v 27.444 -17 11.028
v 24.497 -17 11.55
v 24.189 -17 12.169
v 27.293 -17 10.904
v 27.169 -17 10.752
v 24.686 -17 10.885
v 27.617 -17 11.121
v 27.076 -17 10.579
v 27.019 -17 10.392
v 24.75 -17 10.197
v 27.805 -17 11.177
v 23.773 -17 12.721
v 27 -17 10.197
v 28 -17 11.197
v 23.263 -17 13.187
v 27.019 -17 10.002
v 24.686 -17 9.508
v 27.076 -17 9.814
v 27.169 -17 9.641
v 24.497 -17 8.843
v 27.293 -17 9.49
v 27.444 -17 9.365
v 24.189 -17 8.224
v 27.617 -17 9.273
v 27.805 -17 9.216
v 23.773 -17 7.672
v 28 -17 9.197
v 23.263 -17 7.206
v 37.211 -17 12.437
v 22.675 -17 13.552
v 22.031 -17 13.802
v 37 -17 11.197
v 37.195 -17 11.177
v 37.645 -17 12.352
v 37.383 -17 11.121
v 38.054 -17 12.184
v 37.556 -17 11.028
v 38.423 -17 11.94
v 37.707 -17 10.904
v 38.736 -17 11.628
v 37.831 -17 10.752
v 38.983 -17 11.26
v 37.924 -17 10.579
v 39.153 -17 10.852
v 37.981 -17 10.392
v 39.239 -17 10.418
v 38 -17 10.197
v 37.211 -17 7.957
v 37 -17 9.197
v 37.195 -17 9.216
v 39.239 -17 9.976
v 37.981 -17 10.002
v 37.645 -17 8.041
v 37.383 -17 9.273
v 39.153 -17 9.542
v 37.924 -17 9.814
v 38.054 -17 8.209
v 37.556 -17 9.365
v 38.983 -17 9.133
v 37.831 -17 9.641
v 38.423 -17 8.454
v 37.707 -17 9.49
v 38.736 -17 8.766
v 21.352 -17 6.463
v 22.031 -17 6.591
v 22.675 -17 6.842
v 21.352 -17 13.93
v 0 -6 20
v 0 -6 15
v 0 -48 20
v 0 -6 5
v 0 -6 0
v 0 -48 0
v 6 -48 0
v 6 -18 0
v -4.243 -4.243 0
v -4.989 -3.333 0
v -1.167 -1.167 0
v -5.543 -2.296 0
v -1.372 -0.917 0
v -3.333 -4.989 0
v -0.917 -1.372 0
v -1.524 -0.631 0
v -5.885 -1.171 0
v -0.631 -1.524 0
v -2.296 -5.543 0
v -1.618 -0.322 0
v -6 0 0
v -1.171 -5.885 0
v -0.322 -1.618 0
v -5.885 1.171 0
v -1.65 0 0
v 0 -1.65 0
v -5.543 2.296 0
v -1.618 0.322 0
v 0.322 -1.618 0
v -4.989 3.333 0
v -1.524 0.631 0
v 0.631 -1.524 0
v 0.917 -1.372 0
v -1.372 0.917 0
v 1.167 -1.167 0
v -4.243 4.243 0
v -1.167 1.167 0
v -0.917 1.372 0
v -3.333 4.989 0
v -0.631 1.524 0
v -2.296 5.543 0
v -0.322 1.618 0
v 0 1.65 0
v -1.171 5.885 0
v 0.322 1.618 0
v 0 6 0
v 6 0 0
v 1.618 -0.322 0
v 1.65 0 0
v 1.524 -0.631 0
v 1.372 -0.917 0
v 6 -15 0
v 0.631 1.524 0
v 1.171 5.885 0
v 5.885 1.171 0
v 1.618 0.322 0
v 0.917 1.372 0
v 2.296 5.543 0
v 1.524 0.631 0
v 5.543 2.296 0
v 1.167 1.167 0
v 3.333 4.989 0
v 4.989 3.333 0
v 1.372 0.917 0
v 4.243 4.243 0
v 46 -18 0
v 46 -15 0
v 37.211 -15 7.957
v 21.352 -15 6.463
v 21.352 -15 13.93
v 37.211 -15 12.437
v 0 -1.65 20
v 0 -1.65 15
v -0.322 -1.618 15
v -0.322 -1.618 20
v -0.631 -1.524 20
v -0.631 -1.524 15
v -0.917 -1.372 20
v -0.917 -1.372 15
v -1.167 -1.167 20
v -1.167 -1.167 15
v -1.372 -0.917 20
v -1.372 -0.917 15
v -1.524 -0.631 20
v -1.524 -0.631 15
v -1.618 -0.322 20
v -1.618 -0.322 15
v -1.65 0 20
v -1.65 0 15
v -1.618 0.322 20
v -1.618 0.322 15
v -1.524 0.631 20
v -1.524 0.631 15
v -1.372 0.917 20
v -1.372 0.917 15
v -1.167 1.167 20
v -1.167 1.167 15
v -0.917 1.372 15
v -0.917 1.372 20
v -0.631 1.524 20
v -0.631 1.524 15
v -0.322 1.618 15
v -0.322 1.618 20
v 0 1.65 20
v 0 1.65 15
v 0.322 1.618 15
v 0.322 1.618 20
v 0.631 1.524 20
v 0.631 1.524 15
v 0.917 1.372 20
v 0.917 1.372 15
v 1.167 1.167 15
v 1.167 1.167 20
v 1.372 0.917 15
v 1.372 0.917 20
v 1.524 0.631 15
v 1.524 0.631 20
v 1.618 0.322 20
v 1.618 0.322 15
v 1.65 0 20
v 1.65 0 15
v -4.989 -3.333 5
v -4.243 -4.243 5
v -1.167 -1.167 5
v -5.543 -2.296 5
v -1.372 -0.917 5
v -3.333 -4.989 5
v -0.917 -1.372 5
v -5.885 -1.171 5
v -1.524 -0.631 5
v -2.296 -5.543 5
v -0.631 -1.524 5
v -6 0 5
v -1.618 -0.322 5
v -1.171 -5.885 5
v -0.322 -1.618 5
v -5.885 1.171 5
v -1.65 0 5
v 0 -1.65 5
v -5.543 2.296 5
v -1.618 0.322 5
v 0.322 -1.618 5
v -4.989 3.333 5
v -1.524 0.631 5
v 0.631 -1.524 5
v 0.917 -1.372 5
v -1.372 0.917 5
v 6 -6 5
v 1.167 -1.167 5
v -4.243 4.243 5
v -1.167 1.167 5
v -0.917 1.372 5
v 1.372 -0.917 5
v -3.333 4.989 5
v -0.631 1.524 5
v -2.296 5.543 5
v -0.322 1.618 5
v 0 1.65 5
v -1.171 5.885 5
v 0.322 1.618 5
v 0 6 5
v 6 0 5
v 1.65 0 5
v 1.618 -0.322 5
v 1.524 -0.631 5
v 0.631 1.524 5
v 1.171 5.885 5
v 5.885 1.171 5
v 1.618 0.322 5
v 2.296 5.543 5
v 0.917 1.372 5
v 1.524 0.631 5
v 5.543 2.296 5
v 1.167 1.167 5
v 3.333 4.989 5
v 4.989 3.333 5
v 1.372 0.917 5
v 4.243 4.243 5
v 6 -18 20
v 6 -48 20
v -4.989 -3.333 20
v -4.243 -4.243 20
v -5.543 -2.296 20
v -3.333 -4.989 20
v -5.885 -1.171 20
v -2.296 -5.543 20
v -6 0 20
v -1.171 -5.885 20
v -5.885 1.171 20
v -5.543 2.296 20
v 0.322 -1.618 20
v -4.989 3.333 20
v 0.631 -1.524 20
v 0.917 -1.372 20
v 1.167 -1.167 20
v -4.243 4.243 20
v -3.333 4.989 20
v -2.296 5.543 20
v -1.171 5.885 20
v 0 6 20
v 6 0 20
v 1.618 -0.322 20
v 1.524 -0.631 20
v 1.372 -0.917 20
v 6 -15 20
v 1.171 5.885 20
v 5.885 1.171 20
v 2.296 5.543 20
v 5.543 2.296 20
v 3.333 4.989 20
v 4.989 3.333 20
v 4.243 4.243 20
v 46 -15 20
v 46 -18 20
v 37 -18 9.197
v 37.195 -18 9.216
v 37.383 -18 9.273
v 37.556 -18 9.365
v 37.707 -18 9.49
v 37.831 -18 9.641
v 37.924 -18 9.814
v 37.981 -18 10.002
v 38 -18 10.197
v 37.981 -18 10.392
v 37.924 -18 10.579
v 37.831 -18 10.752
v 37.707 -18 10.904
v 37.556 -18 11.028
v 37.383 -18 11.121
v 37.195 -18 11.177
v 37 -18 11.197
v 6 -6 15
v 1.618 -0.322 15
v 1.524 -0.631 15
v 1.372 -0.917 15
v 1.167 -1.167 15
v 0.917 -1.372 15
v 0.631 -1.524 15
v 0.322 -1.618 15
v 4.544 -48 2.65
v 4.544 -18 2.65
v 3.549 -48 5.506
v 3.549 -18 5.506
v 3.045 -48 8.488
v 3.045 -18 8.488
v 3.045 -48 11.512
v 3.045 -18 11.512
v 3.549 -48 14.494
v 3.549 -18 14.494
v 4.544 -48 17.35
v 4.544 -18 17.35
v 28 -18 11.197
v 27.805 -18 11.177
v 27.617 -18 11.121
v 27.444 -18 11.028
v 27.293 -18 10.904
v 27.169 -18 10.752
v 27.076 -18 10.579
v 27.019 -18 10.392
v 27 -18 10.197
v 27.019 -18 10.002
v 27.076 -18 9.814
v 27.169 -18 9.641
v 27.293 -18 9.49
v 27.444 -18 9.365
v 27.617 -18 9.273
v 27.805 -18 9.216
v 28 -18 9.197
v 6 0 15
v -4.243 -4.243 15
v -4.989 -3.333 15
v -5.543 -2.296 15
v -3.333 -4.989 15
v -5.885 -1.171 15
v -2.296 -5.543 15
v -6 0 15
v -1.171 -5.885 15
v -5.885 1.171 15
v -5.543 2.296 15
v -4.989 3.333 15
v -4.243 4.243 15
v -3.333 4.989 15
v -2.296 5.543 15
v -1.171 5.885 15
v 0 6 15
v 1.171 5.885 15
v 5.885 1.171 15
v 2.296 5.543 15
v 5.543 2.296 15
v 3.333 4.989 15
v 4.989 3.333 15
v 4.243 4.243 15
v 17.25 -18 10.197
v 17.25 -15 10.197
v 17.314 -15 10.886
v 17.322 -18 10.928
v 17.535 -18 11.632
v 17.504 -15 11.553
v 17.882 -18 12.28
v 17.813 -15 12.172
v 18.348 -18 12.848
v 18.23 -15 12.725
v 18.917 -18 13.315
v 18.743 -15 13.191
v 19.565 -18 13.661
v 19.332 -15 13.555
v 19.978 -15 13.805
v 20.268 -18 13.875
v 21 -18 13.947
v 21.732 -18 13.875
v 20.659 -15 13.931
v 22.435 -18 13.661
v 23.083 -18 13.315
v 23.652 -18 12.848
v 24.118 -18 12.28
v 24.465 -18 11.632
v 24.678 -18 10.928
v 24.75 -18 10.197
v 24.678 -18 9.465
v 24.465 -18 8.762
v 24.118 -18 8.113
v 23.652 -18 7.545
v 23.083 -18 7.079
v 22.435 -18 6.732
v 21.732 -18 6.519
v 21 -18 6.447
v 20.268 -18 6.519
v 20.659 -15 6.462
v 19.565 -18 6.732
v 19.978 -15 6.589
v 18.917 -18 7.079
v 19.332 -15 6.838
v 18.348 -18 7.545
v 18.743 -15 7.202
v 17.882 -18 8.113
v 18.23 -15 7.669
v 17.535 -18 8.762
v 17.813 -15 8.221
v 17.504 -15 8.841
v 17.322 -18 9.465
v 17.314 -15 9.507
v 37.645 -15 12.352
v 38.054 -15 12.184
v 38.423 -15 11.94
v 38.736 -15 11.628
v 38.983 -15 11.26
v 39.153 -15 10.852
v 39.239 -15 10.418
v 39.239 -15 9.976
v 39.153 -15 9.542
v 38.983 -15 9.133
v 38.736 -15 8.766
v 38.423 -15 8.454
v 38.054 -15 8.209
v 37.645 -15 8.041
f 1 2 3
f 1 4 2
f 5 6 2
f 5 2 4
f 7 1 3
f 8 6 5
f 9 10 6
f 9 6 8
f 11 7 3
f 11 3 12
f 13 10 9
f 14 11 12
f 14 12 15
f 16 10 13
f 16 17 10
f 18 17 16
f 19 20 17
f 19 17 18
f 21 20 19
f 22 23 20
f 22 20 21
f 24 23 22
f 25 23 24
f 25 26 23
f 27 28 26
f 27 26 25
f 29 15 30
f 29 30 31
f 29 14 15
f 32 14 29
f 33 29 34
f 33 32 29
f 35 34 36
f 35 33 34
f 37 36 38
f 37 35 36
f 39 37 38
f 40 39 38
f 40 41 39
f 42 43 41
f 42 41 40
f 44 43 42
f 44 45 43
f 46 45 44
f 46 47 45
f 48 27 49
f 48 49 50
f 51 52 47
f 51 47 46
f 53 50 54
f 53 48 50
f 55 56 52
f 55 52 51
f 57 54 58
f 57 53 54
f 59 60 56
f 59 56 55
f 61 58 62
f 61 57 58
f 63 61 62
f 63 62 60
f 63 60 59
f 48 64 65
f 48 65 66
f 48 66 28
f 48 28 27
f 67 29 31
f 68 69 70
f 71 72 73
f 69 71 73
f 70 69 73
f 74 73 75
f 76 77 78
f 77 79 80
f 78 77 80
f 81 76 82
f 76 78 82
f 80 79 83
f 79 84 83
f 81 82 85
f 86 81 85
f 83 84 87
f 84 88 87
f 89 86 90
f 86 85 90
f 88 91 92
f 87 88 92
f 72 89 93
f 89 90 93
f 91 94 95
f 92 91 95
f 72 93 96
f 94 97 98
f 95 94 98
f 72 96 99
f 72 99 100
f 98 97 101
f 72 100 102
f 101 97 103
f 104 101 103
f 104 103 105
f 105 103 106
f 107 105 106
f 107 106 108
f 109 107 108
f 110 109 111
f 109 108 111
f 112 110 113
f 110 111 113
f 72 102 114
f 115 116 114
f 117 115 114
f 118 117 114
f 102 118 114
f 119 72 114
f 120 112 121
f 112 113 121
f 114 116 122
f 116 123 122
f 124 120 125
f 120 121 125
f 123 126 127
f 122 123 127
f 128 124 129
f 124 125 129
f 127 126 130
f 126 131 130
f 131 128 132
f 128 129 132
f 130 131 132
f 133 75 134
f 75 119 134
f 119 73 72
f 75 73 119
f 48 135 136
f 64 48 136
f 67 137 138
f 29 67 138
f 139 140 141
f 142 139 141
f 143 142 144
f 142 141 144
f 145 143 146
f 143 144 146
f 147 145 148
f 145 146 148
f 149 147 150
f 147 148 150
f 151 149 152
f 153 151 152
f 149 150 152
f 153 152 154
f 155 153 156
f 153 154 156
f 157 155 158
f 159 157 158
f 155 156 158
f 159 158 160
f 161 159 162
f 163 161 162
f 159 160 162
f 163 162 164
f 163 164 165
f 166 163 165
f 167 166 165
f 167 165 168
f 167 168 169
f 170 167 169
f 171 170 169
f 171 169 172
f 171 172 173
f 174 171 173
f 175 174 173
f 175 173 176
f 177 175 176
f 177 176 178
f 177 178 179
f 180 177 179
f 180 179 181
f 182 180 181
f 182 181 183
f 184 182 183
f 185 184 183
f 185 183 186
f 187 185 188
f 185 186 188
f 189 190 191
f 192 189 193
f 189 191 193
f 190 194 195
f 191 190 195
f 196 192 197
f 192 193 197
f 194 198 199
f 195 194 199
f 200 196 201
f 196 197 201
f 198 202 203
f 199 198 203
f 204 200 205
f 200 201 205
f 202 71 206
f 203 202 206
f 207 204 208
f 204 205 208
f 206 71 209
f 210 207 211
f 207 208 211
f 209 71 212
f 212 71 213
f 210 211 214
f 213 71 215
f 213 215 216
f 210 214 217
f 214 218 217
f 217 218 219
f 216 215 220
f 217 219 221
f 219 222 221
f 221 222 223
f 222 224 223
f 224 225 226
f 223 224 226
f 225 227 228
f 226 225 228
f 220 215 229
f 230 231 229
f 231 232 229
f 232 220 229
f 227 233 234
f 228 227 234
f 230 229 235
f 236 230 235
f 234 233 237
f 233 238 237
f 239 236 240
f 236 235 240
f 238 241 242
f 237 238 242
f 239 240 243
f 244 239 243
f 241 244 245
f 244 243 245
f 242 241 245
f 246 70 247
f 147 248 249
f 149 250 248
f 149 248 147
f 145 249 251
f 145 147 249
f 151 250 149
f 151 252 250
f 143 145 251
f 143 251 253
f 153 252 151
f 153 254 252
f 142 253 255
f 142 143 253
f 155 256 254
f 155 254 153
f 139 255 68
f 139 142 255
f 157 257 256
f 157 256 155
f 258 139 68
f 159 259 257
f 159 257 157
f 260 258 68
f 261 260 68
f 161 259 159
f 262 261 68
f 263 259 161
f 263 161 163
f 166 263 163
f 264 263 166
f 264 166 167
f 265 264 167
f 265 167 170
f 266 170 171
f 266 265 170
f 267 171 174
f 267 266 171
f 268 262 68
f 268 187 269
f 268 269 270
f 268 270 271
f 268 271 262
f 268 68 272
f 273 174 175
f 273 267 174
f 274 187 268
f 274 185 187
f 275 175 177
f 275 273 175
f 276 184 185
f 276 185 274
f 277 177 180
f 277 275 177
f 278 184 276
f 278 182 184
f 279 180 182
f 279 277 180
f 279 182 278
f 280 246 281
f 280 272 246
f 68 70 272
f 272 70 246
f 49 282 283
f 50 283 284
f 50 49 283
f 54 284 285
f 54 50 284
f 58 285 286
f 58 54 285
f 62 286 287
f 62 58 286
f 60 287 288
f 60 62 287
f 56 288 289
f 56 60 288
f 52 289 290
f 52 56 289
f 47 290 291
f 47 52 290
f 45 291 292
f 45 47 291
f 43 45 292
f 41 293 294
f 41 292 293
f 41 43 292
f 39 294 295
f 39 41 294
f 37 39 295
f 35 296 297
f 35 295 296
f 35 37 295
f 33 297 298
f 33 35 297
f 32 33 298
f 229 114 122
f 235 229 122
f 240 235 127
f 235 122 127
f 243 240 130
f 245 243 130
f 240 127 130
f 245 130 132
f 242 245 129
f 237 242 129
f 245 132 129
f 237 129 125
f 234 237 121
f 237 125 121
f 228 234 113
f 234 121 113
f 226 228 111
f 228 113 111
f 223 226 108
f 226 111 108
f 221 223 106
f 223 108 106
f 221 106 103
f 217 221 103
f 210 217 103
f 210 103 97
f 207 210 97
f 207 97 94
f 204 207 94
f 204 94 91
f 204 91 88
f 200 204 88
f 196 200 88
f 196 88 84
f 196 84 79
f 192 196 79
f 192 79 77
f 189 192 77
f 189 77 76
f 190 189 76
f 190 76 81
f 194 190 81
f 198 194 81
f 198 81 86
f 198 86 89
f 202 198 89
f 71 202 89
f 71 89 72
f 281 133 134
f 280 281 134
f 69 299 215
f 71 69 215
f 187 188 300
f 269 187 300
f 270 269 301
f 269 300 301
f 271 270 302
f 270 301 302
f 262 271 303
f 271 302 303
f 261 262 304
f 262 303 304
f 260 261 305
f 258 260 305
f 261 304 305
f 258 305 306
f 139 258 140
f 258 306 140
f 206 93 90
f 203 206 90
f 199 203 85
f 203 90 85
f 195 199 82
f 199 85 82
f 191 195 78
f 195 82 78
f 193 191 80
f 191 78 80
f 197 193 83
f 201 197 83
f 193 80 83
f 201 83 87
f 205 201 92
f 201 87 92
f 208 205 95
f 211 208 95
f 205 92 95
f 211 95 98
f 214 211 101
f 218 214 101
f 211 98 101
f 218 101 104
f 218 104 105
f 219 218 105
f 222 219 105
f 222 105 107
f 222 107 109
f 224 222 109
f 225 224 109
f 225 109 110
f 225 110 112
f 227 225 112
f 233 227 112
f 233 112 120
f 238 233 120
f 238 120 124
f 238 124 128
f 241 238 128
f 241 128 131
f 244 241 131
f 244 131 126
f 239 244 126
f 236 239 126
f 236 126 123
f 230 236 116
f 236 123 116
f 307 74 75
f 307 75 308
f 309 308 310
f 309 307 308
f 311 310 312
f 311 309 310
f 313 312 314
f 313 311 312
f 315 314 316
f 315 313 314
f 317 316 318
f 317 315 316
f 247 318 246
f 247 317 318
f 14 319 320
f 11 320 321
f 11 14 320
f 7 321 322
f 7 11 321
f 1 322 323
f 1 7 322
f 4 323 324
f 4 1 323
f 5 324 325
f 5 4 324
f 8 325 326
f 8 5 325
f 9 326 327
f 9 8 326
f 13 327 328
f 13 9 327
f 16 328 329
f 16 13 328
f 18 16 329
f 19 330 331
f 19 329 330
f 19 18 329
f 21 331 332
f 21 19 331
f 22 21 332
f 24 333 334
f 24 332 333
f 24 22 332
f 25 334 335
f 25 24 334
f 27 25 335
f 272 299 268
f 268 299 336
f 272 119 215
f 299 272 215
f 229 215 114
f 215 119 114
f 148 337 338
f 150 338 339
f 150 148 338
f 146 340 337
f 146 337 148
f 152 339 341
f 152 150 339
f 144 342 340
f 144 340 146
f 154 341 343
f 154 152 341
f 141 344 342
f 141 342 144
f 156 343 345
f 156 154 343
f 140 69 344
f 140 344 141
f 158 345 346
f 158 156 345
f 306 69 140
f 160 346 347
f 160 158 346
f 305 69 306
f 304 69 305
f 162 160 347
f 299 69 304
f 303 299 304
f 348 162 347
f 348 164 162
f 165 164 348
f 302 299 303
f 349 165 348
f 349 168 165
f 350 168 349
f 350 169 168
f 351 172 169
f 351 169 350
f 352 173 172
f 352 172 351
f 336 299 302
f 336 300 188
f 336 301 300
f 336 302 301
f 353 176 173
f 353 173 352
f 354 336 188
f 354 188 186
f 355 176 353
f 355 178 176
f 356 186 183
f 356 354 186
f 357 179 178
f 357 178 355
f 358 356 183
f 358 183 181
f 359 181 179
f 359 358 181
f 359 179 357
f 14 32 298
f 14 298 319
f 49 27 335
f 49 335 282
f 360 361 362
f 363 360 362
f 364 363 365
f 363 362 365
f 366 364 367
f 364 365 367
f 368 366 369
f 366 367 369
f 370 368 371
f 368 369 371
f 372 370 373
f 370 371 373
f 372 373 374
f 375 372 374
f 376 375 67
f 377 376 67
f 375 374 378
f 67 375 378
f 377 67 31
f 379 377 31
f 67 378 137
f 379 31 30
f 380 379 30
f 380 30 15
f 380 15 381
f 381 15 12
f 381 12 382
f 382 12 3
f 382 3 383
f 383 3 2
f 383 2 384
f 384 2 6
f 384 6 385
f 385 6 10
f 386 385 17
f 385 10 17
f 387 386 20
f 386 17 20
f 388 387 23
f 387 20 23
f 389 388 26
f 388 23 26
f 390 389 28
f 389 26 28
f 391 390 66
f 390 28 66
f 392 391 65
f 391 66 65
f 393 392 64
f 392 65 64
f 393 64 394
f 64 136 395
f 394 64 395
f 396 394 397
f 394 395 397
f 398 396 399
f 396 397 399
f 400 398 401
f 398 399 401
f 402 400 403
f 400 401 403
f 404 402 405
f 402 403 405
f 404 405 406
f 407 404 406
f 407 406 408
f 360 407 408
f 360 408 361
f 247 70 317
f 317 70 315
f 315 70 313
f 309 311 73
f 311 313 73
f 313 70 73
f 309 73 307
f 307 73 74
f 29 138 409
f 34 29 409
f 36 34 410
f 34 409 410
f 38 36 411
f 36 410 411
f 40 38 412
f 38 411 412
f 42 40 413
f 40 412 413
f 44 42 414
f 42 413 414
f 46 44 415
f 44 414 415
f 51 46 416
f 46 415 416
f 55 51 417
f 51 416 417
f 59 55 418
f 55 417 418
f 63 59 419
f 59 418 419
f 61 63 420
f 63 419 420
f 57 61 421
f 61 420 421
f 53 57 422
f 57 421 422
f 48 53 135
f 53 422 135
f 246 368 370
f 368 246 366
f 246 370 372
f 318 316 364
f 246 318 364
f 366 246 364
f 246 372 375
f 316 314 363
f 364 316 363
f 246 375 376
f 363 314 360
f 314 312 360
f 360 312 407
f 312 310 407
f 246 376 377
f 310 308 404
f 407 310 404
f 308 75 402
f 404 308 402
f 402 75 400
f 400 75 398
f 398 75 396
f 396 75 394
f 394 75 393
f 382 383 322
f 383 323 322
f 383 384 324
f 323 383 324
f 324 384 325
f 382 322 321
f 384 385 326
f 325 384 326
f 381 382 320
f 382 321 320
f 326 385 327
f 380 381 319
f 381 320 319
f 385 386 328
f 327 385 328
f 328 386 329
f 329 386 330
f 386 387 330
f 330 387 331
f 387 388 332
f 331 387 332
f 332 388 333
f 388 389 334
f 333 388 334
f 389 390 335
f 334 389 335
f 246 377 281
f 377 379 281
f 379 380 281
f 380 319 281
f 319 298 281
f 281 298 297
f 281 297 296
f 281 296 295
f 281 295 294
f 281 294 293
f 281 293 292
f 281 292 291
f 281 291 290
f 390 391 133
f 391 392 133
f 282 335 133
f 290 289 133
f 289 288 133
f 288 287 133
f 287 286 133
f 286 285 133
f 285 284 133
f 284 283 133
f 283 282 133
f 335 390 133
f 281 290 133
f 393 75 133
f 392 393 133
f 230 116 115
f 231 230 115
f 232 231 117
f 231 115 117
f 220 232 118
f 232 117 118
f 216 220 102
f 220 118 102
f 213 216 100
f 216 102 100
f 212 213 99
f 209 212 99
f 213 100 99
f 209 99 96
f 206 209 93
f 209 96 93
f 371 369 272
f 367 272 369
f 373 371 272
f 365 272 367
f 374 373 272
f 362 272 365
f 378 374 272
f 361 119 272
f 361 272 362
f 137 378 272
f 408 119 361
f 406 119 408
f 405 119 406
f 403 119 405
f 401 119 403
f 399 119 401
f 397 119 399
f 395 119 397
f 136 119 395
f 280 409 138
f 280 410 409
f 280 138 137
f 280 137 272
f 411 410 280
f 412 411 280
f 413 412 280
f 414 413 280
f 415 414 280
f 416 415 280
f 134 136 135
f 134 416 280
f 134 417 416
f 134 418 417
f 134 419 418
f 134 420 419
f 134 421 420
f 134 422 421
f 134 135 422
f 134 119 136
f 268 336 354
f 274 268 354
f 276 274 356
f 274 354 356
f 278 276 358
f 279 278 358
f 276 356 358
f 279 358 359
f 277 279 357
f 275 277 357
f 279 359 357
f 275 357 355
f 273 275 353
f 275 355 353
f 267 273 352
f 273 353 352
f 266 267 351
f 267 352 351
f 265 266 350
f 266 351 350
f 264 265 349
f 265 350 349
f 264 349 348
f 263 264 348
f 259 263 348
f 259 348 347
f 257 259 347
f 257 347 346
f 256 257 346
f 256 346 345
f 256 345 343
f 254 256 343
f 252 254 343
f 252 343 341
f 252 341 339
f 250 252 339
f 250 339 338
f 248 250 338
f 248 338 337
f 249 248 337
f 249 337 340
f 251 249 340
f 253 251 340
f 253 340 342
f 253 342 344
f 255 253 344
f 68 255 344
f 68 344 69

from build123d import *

# Parameters (mm, degrees)
SKETCH_1_W          = 40
SKETCH_1_H          = 3
EXTRUDE_1_DEPTH     = 20
SKETCH_2_R          = 2.25
CUT_EXTRUDE_1_DEPTH = 2
SKETCH_3_R          = 3.75
CUT_EXTRUDE_2_DEPTH = 3
CUT_EXTRUDE_3_DEPTH = 3
SKETCH_5_W          = 10
SKETCH_5_H          = 12
CUT_EXTRUDE_4_DEPTH = 12
CUT_EXTRUDE_5_DEPTH = 30


with BuildPart() as part:
    # 草图1 → 凸台-拉伸1 (new body)
    with BuildSketch(Plane.XY):
        with BuildLine():
            ThreePointArc((0, -1.65), (-1.166726189, 1.166726189), (1.65, 0))
            Line((1.65, 0), (6, 0))
            ThreePointArc((6, 0), (-4.242640687, 4.242640687), (0, -6))
            Line((0, -6), (0, -1.65))
        make_face()
        with BuildLine():
            Line((6, 0), (1.65, 0))
            ThreePointArc((1.65, 0), (1.166726189, -1.166726189), (0, -1.65))
            Line((0, -1.65), (0, -6))
            ThreePointArc((0, -6), (4.242640687, -4.242640687), (6, 0))
        make_face()
        with BuildLine():
            Line((6, -15), (6, 0))
            ThreePointArc((6, 0), (4.242640687, -4.242640687), (0, -6))
            Line((0, -6), (0, -48))
            Line((0, -48), (6, -48))
            Line((6, -48), (6, -18))
            Line((6, -18), (6, -15))
        make_face()
        with Locations((26, -16.5)):
            Rectangle(SKETCH_1_W, SKETCH_1_H)
    extrude(amount=EXTRUDE_1_DEPTH)

    # 草图2 → 切除-拉伸1 (cut)
    with BuildSketch(Plane(origin=(0, -15, 0), x_dir=(1, 0, 0), z_dir=(0, 1, 0))):
        with BuildLine():
            ThreePointArc((37.2109375, -12.436802432), (34.75, -10.196711949), (37.2109375, -7.956621466))
            Line((37.2109375, -7.956621466), (21.3515625, -6.463227811))
            ThreePointArc((21.3515625, -6.463227811), (23.773162398, -7.672415946), (24.75, -10.196711949))
            ThreePointArc((24.75, -10.196711949), (23.773162398, -12.721007952), (21.3515625, -13.930196087))
            Line((21.3515625, -13.930196087), (37.2109375, -12.436802432))
        make_face()
        with Locations((37, -10.196711949)):
            Circle(SKETCH_2_R)
    extrude(amount=-CUT_EXTRUDE_1_DEPTH, mode=Mode.SUBTRACT)

    # 草图3 → 切除-拉伸2 (cut)
    with BuildSketch(Plane(origin=(0, -15, 0), x_dir=(1, 0, 0), z_dir=(0, 1, 0))):
        with Locations(Location((21, -10.196711949, 0), (0, 0, 180))):
            Circle(SKETCH_3_R)
    extrude(amount=-CUT_EXTRUDE_2_DEPTH, mode=Mode.SUBTRACT)

    # 草图4 → 切除-拉伸3 (cut)
    with BuildSketch(Plane(origin=(0, -17, 0), x_dir=(1, 0, 0), z_dir=(0, 1, 0))):
        with BuildLine():
            Line((28, -9.196711949), (37, -9.196711949))
            ThreePointArc((37, -9.196711949), (38, -10.196711949), (37, -11.196711949))
            Line((37, -11.196711949), (28, -11.196711949))
            ThreePointArc((28, -11.196711949), (27, -10.196711949), (28, -9.196711949))
        make_face()
    extrude(amount=-CUT_EXTRUDE_3_DEPTH, mode=Mode.SUBTRACT)

    # 草图5 → 切除-拉伸4 (cut)
    with BuildSketch(Plane(origin=(6, 0, 0), x_dir=(0, 0, -1), z_dir=(1, 0, 0))):
        with Locations((-10, 0)):
            Rectangle(SKETCH_5_W, SKETCH_5_H)
    extrude(amount=-CUT_EXTRUDE_4_DEPTH, mode=Mode.SUBTRACT)

    # 草图6 → 切除-拉伸5 (cut)
    with BuildSketch(Plane.XZ.offset(48)):
        with BuildLine():
            Line((6, 20), (6, 0))
            ThreePointArc((6, 0), (2.981888497, 10), (6, 20))
        make_face()
    extrude(amount=-CUT_EXTRUDE_5_DEPTH, mode=Mode.SUBTRACT)


solid = part.part
